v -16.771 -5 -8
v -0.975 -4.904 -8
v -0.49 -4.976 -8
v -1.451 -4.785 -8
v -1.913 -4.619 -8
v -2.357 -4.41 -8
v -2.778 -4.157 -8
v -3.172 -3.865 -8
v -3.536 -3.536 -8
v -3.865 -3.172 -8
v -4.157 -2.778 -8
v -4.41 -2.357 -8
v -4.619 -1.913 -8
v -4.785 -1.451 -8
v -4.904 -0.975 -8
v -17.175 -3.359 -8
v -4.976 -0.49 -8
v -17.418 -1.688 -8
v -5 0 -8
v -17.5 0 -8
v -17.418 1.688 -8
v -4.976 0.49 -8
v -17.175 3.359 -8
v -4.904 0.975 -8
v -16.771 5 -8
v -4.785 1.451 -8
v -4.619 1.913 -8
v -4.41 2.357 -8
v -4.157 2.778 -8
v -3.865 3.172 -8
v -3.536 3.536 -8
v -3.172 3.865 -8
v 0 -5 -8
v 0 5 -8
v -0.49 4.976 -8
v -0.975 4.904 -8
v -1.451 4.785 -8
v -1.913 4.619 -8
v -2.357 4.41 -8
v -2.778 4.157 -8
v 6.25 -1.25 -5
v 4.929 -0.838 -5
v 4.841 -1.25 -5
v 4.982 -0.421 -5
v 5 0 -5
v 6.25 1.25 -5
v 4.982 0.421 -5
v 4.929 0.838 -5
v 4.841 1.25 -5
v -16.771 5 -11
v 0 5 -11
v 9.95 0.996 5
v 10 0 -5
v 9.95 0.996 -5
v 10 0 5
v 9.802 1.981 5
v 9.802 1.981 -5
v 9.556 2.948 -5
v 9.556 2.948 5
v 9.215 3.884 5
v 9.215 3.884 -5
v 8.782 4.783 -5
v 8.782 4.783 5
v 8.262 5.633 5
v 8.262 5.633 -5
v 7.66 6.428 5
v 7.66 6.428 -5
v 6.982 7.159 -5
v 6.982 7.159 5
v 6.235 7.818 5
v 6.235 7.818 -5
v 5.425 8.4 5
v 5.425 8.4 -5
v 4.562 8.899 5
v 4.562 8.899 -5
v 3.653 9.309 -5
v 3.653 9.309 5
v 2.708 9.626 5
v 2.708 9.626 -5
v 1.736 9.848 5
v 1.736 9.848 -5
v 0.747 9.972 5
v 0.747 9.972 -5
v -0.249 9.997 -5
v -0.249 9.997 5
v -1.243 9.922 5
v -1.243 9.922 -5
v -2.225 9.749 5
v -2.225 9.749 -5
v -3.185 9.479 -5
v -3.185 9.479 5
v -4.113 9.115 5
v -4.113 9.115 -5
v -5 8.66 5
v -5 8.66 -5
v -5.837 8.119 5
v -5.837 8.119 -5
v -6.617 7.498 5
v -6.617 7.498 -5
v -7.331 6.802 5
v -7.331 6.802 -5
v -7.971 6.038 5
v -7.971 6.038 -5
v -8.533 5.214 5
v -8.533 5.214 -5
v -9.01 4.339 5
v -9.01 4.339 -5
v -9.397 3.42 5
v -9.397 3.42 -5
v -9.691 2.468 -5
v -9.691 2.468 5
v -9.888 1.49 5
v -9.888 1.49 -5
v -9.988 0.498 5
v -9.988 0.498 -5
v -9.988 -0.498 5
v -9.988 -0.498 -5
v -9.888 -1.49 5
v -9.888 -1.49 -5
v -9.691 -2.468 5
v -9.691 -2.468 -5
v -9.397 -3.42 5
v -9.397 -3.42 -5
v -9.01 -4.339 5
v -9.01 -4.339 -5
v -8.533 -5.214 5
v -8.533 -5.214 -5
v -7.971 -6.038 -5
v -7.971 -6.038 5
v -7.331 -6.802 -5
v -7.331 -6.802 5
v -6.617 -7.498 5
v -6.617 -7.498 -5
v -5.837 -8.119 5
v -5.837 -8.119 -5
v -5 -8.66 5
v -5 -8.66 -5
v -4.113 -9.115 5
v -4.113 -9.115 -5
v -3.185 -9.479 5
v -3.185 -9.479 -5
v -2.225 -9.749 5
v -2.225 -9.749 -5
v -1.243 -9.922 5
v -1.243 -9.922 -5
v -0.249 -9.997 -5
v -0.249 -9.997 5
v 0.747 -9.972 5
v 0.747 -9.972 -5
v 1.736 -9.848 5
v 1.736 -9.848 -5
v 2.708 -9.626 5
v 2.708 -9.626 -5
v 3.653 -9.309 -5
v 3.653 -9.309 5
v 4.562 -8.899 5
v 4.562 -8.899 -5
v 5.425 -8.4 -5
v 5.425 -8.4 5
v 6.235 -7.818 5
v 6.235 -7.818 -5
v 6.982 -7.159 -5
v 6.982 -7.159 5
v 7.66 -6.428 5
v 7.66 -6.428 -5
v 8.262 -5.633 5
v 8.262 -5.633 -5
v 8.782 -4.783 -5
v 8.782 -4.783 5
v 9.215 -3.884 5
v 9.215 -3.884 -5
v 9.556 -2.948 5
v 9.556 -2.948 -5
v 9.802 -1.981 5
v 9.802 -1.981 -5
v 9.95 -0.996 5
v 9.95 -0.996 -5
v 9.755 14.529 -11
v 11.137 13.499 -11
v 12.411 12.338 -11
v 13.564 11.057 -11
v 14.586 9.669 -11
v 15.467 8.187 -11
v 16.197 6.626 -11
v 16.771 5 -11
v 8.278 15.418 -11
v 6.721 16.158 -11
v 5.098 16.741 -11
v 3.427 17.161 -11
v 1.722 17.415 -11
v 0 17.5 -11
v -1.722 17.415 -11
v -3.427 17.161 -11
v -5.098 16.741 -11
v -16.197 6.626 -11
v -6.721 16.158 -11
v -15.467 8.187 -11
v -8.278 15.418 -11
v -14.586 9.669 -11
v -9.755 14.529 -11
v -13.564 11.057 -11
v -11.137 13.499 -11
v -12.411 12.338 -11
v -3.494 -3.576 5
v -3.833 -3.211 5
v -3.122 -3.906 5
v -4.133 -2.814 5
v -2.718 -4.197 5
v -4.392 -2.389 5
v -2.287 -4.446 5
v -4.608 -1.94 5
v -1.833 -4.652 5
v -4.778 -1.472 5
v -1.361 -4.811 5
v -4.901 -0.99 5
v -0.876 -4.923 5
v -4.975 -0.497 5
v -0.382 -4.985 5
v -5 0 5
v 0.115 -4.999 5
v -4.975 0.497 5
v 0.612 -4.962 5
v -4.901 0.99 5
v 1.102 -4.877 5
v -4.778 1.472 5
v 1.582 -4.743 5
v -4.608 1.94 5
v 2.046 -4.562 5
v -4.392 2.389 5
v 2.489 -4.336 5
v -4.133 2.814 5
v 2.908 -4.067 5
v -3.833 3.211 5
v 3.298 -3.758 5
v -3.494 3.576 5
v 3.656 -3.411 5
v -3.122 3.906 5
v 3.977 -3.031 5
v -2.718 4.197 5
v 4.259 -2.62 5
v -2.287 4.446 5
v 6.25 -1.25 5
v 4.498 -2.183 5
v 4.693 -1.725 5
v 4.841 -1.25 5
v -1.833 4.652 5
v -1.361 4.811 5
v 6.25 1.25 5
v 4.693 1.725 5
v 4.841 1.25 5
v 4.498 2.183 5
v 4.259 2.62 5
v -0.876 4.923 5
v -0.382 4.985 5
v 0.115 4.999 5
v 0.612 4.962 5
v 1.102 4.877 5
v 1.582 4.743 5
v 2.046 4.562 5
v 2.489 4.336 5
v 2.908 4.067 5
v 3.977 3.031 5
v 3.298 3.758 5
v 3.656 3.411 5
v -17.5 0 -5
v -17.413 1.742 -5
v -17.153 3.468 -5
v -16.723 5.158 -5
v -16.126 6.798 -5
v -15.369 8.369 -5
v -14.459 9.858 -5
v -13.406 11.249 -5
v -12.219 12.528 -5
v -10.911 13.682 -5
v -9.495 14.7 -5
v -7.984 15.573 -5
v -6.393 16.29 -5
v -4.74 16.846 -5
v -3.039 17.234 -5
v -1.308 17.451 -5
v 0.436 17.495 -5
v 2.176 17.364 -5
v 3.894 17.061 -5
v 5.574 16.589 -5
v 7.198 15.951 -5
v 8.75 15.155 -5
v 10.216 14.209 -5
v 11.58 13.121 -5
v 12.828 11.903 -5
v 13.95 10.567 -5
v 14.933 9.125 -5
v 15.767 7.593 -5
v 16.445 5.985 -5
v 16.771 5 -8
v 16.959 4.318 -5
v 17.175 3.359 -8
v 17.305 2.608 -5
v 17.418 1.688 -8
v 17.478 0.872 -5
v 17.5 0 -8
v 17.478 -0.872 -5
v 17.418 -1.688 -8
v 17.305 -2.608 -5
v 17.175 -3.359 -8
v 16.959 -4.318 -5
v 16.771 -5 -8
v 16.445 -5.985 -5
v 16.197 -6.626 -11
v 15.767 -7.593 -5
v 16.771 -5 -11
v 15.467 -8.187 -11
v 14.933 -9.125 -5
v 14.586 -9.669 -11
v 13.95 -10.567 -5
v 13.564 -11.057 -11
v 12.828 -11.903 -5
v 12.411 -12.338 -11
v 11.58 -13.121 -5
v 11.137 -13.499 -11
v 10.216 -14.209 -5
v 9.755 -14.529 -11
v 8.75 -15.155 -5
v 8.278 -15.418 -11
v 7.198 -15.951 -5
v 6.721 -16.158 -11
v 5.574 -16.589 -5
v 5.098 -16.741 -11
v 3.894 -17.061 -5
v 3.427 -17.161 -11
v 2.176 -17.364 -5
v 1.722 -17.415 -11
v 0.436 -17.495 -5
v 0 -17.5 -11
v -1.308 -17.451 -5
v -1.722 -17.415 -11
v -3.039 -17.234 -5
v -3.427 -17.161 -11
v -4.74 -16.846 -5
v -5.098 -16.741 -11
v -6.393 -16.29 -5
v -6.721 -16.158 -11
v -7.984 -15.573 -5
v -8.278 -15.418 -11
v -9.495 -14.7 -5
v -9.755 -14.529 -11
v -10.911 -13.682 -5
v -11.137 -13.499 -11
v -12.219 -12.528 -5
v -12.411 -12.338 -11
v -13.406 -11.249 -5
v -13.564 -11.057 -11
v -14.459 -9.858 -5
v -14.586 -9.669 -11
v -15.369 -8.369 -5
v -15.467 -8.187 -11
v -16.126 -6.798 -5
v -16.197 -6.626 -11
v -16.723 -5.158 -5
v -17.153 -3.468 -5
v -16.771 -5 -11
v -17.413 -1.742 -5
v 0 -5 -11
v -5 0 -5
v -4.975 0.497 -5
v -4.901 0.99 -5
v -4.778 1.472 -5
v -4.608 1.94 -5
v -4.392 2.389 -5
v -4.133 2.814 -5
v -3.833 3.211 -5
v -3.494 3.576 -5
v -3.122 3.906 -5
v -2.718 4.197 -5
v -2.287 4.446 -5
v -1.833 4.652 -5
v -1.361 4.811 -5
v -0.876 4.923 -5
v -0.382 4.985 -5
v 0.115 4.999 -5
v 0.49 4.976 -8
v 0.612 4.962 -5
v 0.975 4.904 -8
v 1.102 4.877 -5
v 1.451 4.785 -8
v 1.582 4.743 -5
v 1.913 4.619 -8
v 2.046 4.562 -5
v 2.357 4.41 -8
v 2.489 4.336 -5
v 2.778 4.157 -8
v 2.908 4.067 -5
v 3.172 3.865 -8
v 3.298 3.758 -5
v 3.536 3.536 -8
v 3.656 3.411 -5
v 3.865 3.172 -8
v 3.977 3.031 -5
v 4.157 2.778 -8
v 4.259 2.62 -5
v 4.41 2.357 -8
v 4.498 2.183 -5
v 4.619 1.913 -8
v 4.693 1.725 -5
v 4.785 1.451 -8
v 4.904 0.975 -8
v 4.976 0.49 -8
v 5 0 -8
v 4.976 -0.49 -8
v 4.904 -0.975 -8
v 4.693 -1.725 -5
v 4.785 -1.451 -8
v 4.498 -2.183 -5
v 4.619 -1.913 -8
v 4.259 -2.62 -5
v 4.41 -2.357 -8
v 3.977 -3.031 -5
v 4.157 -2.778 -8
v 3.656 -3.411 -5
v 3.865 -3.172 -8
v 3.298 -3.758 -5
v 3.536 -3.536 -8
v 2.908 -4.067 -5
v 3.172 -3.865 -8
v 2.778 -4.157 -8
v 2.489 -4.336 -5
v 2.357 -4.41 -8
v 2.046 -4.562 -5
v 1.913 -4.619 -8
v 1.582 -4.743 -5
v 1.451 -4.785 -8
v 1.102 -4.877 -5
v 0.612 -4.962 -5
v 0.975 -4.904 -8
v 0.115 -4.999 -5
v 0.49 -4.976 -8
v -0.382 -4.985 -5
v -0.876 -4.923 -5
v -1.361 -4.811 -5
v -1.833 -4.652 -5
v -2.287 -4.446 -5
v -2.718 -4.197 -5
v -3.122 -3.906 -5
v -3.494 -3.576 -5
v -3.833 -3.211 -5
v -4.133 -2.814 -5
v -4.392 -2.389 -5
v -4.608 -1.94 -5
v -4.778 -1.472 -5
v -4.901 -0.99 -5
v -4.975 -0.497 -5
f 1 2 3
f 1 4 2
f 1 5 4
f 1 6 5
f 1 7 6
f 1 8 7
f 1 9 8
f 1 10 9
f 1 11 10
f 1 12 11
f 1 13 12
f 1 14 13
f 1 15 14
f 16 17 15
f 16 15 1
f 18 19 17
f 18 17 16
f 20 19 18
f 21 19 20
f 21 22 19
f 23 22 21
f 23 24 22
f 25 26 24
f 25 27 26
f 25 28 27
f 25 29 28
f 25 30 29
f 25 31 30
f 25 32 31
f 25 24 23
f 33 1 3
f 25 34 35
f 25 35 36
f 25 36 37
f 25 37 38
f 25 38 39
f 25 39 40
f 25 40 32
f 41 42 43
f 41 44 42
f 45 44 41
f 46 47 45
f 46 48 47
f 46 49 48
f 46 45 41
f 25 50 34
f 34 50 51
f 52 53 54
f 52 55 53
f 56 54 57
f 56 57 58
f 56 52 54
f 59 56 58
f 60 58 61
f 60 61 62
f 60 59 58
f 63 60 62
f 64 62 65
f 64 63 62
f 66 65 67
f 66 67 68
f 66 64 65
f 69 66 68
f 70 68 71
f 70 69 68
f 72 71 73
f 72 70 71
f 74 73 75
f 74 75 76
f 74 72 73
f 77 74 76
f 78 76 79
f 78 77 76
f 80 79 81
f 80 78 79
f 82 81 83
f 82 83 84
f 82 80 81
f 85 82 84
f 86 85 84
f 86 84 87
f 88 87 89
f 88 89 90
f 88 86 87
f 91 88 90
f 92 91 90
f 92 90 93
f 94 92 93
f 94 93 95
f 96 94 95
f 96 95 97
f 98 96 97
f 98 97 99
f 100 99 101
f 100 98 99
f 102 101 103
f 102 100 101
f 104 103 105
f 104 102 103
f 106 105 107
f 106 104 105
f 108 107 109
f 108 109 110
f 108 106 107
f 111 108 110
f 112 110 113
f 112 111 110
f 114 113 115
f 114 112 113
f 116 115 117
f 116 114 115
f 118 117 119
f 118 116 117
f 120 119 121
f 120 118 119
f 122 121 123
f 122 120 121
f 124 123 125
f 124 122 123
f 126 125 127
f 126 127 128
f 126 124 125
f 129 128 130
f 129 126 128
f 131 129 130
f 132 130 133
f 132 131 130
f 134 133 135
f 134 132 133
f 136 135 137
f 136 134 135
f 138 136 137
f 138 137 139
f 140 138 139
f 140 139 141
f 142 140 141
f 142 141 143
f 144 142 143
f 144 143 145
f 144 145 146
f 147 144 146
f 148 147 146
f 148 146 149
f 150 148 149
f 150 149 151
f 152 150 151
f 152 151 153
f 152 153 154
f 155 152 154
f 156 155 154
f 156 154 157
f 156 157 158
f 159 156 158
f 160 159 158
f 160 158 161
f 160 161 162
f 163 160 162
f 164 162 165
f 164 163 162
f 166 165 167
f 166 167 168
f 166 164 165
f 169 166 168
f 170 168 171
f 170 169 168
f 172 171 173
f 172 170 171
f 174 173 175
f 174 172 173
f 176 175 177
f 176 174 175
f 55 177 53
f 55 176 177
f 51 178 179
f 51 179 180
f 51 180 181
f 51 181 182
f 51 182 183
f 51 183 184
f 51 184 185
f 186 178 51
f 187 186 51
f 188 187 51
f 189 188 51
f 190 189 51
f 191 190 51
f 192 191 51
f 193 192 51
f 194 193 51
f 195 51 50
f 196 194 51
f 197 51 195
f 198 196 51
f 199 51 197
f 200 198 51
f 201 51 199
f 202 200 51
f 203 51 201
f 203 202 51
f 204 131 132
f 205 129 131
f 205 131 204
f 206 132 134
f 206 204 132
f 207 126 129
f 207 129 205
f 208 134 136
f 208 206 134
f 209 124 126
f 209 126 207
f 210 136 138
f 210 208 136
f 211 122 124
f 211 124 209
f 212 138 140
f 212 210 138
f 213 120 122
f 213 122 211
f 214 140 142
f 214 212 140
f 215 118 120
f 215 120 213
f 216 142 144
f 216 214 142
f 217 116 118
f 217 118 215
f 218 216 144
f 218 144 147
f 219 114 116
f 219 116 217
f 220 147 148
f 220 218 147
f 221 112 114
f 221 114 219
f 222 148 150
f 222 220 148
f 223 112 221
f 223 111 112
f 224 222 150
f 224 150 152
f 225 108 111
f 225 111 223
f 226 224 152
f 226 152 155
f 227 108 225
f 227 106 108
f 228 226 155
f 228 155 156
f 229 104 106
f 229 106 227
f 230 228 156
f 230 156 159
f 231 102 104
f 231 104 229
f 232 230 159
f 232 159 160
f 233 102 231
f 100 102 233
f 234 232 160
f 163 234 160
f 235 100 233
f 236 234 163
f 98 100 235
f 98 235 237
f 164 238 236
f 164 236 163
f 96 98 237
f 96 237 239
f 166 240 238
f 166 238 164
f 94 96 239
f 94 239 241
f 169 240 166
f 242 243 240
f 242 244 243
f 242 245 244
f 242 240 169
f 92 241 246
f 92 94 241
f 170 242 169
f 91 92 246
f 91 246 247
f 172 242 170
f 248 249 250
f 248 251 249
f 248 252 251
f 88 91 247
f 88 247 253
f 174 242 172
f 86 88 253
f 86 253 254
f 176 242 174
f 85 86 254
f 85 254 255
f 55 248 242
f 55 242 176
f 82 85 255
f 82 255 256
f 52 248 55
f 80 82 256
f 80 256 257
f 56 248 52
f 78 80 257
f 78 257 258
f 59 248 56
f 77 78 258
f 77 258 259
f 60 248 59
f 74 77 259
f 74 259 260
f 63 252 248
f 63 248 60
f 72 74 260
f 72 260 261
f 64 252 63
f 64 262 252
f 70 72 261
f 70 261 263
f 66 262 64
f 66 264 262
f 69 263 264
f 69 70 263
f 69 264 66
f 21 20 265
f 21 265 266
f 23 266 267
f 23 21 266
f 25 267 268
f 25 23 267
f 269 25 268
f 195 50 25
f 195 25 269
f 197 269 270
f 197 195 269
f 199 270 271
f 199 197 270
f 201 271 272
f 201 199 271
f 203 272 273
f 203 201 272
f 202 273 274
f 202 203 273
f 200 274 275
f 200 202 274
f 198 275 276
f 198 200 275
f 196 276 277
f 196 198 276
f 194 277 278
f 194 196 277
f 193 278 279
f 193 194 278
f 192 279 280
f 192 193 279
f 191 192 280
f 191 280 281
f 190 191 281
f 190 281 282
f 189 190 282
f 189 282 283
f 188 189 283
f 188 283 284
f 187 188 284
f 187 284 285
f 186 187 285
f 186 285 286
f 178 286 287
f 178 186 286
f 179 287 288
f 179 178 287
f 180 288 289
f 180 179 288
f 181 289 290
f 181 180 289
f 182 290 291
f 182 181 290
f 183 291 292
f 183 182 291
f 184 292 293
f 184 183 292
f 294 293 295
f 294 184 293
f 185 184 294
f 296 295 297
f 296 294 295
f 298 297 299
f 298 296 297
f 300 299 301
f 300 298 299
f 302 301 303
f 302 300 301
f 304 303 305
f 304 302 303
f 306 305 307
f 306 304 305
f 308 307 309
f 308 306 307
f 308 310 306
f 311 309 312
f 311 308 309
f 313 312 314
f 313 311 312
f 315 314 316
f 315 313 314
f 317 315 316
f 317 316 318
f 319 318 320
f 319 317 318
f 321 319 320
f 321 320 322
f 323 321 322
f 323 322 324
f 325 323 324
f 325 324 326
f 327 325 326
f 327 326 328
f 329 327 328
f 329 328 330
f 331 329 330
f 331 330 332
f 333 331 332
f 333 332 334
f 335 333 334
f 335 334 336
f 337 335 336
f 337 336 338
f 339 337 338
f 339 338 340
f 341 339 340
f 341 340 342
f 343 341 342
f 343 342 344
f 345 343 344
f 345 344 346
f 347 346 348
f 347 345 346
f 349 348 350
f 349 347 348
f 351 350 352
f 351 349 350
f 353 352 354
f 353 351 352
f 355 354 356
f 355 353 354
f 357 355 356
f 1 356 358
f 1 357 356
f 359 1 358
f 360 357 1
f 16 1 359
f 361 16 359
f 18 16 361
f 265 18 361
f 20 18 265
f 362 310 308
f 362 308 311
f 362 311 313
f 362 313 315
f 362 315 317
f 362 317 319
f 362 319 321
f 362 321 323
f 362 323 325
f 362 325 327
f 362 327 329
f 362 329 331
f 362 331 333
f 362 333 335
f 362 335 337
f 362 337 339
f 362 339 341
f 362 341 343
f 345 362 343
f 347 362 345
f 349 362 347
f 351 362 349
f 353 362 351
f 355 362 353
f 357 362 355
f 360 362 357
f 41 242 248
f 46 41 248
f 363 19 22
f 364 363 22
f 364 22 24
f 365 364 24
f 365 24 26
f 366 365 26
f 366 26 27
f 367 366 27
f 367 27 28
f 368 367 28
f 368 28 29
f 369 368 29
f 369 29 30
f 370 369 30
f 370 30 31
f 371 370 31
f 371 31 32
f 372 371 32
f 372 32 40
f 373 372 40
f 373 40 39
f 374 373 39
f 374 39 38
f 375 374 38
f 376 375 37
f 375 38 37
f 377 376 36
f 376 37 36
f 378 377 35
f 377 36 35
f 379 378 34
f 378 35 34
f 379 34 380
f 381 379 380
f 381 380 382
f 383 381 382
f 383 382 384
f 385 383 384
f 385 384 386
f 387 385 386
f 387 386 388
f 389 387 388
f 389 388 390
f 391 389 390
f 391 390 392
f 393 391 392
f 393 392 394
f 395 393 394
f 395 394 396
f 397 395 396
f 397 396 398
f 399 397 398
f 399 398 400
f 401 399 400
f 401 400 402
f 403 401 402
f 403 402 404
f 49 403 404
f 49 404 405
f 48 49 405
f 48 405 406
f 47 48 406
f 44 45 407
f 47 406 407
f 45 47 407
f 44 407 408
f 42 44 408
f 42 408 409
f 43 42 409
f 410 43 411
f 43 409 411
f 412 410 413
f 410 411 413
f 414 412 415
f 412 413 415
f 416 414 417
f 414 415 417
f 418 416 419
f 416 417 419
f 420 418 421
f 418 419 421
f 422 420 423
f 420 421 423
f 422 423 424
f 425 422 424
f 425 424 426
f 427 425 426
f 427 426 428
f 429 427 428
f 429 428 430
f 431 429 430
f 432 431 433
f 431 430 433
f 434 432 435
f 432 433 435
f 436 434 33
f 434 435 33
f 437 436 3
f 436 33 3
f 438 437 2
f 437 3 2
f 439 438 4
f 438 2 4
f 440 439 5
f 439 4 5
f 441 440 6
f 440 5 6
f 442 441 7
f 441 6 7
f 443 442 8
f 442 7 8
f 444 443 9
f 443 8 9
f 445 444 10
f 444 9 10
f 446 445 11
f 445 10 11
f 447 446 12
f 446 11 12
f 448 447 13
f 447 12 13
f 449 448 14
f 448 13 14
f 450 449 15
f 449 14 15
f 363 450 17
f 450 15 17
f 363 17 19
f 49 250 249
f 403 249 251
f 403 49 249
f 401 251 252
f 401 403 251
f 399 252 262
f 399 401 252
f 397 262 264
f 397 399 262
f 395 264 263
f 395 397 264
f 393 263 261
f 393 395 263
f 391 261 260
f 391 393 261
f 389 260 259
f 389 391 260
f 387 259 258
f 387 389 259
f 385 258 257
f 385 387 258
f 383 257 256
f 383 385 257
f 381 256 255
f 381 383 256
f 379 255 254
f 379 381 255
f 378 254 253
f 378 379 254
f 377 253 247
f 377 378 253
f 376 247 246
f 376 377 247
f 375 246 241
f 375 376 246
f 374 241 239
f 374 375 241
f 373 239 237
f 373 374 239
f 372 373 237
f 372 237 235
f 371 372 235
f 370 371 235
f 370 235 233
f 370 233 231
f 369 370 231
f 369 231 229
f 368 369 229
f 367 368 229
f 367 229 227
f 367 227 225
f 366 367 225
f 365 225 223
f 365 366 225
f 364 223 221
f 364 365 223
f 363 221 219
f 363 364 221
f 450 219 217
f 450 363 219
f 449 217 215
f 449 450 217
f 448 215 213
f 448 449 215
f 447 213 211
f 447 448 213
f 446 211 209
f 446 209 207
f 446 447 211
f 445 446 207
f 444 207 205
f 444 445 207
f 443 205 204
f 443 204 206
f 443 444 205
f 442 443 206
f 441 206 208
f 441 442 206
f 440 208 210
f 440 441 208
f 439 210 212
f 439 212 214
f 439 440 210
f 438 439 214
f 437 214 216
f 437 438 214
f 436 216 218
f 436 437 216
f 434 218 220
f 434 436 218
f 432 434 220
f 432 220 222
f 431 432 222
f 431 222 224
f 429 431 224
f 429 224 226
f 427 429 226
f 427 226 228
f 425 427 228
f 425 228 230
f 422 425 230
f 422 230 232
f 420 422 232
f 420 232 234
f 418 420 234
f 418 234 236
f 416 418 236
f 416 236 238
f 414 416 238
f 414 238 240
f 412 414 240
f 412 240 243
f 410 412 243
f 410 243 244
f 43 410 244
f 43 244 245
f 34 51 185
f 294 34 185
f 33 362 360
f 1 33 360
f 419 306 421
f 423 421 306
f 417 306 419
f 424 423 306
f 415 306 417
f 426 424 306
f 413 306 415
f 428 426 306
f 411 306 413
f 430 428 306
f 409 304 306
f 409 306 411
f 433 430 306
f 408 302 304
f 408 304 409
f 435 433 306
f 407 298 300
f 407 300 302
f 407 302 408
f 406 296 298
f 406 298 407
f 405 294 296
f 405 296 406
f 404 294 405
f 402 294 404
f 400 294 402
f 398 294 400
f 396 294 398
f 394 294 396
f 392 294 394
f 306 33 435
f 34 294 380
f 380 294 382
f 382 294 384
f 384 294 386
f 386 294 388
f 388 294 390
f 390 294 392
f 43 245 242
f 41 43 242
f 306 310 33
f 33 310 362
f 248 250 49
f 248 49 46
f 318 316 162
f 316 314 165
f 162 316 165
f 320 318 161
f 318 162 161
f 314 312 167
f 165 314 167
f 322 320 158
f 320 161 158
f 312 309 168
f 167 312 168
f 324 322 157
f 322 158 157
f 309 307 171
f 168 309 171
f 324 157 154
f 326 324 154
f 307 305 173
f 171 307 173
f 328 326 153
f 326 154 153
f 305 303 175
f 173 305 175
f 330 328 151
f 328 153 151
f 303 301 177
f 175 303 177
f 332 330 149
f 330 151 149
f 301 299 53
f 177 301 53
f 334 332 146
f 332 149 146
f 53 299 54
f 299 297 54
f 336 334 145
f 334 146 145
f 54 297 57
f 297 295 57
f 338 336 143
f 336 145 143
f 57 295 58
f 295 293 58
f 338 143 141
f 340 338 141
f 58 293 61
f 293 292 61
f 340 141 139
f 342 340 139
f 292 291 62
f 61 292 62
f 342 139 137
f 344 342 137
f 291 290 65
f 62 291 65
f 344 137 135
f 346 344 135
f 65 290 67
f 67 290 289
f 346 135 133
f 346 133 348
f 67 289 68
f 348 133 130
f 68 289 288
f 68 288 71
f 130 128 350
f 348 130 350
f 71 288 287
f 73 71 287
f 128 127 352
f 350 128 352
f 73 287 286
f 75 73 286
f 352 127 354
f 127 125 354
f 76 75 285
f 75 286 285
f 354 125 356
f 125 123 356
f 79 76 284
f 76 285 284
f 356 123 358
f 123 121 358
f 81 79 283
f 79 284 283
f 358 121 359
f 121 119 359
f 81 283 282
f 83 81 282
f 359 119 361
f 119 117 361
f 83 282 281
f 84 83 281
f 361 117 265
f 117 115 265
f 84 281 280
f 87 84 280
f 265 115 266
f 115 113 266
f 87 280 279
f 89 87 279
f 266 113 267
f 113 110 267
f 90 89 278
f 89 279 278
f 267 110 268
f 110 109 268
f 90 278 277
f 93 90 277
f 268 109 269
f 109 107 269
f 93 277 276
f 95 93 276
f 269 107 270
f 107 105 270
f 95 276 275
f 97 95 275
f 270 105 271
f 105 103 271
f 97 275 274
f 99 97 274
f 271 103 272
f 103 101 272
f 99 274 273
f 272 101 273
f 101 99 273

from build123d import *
from build123d.topology import SkipClean

# Parameters (mm, degrees)
SKETCH1_R           = 10
SKETCH1_R_2         = 5
BOSS_EXTRUDE1_DEPTH = 5
BOSS_EXTRUDE2_START = 6
SKETCH3_R           = 17.5
SKETCH3_R_2         = 5
BOSS_EXTRUDE2_DEPTH = 6
CUT_EXTRUDE1_DEPTH  = 3
SKETCH5_W           = 2.5
SKETCH5_H           = 2.5
CUT_EXTRUDE2_DEPTH  = 10


with BuildPart() as part:
    # Sketch1 → Boss-Extrude1 (new, symmetric)
    with BuildSketch(Plane.XY):
        Circle(SKETCH1_R)
        Circle(SKETCH1_R_2, mode=Mode.SUBTRACT)
    extrude(amount=BOSS_EXTRUDE1_DEPTH, both=True)

    # Sketch3 → Boss-Extrude2 (add)
    with SkipClean():  # the faces are left unmerged after this step: merging them gives an invalid solid
        with BuildSketch(Plane(origin=(0, 0, -5), x_dir=(-1, 0, 0), z_dir=(0, 0, -1)).offset(BOSS_EXTRUDE2_START)):
            Circle(SKETCH3_R)
            Circle(SKETCH3_R_2, mode=Mode.SUBTRACT)
        extrude(amount=-BOSS_EXTRUDE2_DEPTH)

    # Sketch4 → Cut-Extrude1 (cut)
    with SkipClean():  # the faces are left unmerged after this step: merging them gives an invalid solid
        with BuildSketch(Plane(origin=(0, 0, -11), x_dir=(-1, 0, 0), z_dir=(0, 0, -1))):
            with BuildLine():
                Line((-16.770509831, -5), (16.770509831, -5))
                ThreePointArc((16.770509831, -5), (17.5, 0), (16.770509831, 5))
                Line((16.770509831, 5), (-16.770509831, 5))
                ThreePointArc((-16.770509831, 5), (-17.5, 0), (-16.770509831, -5))
            make_face()
        extrude(amount=-CUT_EXTRUDE1_DEPTH, mode=Mode.SUBTRACT)

    # Sketch5 → Cut-Extrude2 (cut)
    with SkipClean():  # the faces are left unmerged after this step: merging them gives an invalid solid
        with BuildSketch(Plane.XY.offset(5)):
            with Locations((5, 0)):
                Rectangle(SKETCH5_W, SKETCH5_H)
        extrude(amount=-CUT_EXTRUDE2_DEPTH, mode=Mode.SUBTRACT)


solid = part.part
